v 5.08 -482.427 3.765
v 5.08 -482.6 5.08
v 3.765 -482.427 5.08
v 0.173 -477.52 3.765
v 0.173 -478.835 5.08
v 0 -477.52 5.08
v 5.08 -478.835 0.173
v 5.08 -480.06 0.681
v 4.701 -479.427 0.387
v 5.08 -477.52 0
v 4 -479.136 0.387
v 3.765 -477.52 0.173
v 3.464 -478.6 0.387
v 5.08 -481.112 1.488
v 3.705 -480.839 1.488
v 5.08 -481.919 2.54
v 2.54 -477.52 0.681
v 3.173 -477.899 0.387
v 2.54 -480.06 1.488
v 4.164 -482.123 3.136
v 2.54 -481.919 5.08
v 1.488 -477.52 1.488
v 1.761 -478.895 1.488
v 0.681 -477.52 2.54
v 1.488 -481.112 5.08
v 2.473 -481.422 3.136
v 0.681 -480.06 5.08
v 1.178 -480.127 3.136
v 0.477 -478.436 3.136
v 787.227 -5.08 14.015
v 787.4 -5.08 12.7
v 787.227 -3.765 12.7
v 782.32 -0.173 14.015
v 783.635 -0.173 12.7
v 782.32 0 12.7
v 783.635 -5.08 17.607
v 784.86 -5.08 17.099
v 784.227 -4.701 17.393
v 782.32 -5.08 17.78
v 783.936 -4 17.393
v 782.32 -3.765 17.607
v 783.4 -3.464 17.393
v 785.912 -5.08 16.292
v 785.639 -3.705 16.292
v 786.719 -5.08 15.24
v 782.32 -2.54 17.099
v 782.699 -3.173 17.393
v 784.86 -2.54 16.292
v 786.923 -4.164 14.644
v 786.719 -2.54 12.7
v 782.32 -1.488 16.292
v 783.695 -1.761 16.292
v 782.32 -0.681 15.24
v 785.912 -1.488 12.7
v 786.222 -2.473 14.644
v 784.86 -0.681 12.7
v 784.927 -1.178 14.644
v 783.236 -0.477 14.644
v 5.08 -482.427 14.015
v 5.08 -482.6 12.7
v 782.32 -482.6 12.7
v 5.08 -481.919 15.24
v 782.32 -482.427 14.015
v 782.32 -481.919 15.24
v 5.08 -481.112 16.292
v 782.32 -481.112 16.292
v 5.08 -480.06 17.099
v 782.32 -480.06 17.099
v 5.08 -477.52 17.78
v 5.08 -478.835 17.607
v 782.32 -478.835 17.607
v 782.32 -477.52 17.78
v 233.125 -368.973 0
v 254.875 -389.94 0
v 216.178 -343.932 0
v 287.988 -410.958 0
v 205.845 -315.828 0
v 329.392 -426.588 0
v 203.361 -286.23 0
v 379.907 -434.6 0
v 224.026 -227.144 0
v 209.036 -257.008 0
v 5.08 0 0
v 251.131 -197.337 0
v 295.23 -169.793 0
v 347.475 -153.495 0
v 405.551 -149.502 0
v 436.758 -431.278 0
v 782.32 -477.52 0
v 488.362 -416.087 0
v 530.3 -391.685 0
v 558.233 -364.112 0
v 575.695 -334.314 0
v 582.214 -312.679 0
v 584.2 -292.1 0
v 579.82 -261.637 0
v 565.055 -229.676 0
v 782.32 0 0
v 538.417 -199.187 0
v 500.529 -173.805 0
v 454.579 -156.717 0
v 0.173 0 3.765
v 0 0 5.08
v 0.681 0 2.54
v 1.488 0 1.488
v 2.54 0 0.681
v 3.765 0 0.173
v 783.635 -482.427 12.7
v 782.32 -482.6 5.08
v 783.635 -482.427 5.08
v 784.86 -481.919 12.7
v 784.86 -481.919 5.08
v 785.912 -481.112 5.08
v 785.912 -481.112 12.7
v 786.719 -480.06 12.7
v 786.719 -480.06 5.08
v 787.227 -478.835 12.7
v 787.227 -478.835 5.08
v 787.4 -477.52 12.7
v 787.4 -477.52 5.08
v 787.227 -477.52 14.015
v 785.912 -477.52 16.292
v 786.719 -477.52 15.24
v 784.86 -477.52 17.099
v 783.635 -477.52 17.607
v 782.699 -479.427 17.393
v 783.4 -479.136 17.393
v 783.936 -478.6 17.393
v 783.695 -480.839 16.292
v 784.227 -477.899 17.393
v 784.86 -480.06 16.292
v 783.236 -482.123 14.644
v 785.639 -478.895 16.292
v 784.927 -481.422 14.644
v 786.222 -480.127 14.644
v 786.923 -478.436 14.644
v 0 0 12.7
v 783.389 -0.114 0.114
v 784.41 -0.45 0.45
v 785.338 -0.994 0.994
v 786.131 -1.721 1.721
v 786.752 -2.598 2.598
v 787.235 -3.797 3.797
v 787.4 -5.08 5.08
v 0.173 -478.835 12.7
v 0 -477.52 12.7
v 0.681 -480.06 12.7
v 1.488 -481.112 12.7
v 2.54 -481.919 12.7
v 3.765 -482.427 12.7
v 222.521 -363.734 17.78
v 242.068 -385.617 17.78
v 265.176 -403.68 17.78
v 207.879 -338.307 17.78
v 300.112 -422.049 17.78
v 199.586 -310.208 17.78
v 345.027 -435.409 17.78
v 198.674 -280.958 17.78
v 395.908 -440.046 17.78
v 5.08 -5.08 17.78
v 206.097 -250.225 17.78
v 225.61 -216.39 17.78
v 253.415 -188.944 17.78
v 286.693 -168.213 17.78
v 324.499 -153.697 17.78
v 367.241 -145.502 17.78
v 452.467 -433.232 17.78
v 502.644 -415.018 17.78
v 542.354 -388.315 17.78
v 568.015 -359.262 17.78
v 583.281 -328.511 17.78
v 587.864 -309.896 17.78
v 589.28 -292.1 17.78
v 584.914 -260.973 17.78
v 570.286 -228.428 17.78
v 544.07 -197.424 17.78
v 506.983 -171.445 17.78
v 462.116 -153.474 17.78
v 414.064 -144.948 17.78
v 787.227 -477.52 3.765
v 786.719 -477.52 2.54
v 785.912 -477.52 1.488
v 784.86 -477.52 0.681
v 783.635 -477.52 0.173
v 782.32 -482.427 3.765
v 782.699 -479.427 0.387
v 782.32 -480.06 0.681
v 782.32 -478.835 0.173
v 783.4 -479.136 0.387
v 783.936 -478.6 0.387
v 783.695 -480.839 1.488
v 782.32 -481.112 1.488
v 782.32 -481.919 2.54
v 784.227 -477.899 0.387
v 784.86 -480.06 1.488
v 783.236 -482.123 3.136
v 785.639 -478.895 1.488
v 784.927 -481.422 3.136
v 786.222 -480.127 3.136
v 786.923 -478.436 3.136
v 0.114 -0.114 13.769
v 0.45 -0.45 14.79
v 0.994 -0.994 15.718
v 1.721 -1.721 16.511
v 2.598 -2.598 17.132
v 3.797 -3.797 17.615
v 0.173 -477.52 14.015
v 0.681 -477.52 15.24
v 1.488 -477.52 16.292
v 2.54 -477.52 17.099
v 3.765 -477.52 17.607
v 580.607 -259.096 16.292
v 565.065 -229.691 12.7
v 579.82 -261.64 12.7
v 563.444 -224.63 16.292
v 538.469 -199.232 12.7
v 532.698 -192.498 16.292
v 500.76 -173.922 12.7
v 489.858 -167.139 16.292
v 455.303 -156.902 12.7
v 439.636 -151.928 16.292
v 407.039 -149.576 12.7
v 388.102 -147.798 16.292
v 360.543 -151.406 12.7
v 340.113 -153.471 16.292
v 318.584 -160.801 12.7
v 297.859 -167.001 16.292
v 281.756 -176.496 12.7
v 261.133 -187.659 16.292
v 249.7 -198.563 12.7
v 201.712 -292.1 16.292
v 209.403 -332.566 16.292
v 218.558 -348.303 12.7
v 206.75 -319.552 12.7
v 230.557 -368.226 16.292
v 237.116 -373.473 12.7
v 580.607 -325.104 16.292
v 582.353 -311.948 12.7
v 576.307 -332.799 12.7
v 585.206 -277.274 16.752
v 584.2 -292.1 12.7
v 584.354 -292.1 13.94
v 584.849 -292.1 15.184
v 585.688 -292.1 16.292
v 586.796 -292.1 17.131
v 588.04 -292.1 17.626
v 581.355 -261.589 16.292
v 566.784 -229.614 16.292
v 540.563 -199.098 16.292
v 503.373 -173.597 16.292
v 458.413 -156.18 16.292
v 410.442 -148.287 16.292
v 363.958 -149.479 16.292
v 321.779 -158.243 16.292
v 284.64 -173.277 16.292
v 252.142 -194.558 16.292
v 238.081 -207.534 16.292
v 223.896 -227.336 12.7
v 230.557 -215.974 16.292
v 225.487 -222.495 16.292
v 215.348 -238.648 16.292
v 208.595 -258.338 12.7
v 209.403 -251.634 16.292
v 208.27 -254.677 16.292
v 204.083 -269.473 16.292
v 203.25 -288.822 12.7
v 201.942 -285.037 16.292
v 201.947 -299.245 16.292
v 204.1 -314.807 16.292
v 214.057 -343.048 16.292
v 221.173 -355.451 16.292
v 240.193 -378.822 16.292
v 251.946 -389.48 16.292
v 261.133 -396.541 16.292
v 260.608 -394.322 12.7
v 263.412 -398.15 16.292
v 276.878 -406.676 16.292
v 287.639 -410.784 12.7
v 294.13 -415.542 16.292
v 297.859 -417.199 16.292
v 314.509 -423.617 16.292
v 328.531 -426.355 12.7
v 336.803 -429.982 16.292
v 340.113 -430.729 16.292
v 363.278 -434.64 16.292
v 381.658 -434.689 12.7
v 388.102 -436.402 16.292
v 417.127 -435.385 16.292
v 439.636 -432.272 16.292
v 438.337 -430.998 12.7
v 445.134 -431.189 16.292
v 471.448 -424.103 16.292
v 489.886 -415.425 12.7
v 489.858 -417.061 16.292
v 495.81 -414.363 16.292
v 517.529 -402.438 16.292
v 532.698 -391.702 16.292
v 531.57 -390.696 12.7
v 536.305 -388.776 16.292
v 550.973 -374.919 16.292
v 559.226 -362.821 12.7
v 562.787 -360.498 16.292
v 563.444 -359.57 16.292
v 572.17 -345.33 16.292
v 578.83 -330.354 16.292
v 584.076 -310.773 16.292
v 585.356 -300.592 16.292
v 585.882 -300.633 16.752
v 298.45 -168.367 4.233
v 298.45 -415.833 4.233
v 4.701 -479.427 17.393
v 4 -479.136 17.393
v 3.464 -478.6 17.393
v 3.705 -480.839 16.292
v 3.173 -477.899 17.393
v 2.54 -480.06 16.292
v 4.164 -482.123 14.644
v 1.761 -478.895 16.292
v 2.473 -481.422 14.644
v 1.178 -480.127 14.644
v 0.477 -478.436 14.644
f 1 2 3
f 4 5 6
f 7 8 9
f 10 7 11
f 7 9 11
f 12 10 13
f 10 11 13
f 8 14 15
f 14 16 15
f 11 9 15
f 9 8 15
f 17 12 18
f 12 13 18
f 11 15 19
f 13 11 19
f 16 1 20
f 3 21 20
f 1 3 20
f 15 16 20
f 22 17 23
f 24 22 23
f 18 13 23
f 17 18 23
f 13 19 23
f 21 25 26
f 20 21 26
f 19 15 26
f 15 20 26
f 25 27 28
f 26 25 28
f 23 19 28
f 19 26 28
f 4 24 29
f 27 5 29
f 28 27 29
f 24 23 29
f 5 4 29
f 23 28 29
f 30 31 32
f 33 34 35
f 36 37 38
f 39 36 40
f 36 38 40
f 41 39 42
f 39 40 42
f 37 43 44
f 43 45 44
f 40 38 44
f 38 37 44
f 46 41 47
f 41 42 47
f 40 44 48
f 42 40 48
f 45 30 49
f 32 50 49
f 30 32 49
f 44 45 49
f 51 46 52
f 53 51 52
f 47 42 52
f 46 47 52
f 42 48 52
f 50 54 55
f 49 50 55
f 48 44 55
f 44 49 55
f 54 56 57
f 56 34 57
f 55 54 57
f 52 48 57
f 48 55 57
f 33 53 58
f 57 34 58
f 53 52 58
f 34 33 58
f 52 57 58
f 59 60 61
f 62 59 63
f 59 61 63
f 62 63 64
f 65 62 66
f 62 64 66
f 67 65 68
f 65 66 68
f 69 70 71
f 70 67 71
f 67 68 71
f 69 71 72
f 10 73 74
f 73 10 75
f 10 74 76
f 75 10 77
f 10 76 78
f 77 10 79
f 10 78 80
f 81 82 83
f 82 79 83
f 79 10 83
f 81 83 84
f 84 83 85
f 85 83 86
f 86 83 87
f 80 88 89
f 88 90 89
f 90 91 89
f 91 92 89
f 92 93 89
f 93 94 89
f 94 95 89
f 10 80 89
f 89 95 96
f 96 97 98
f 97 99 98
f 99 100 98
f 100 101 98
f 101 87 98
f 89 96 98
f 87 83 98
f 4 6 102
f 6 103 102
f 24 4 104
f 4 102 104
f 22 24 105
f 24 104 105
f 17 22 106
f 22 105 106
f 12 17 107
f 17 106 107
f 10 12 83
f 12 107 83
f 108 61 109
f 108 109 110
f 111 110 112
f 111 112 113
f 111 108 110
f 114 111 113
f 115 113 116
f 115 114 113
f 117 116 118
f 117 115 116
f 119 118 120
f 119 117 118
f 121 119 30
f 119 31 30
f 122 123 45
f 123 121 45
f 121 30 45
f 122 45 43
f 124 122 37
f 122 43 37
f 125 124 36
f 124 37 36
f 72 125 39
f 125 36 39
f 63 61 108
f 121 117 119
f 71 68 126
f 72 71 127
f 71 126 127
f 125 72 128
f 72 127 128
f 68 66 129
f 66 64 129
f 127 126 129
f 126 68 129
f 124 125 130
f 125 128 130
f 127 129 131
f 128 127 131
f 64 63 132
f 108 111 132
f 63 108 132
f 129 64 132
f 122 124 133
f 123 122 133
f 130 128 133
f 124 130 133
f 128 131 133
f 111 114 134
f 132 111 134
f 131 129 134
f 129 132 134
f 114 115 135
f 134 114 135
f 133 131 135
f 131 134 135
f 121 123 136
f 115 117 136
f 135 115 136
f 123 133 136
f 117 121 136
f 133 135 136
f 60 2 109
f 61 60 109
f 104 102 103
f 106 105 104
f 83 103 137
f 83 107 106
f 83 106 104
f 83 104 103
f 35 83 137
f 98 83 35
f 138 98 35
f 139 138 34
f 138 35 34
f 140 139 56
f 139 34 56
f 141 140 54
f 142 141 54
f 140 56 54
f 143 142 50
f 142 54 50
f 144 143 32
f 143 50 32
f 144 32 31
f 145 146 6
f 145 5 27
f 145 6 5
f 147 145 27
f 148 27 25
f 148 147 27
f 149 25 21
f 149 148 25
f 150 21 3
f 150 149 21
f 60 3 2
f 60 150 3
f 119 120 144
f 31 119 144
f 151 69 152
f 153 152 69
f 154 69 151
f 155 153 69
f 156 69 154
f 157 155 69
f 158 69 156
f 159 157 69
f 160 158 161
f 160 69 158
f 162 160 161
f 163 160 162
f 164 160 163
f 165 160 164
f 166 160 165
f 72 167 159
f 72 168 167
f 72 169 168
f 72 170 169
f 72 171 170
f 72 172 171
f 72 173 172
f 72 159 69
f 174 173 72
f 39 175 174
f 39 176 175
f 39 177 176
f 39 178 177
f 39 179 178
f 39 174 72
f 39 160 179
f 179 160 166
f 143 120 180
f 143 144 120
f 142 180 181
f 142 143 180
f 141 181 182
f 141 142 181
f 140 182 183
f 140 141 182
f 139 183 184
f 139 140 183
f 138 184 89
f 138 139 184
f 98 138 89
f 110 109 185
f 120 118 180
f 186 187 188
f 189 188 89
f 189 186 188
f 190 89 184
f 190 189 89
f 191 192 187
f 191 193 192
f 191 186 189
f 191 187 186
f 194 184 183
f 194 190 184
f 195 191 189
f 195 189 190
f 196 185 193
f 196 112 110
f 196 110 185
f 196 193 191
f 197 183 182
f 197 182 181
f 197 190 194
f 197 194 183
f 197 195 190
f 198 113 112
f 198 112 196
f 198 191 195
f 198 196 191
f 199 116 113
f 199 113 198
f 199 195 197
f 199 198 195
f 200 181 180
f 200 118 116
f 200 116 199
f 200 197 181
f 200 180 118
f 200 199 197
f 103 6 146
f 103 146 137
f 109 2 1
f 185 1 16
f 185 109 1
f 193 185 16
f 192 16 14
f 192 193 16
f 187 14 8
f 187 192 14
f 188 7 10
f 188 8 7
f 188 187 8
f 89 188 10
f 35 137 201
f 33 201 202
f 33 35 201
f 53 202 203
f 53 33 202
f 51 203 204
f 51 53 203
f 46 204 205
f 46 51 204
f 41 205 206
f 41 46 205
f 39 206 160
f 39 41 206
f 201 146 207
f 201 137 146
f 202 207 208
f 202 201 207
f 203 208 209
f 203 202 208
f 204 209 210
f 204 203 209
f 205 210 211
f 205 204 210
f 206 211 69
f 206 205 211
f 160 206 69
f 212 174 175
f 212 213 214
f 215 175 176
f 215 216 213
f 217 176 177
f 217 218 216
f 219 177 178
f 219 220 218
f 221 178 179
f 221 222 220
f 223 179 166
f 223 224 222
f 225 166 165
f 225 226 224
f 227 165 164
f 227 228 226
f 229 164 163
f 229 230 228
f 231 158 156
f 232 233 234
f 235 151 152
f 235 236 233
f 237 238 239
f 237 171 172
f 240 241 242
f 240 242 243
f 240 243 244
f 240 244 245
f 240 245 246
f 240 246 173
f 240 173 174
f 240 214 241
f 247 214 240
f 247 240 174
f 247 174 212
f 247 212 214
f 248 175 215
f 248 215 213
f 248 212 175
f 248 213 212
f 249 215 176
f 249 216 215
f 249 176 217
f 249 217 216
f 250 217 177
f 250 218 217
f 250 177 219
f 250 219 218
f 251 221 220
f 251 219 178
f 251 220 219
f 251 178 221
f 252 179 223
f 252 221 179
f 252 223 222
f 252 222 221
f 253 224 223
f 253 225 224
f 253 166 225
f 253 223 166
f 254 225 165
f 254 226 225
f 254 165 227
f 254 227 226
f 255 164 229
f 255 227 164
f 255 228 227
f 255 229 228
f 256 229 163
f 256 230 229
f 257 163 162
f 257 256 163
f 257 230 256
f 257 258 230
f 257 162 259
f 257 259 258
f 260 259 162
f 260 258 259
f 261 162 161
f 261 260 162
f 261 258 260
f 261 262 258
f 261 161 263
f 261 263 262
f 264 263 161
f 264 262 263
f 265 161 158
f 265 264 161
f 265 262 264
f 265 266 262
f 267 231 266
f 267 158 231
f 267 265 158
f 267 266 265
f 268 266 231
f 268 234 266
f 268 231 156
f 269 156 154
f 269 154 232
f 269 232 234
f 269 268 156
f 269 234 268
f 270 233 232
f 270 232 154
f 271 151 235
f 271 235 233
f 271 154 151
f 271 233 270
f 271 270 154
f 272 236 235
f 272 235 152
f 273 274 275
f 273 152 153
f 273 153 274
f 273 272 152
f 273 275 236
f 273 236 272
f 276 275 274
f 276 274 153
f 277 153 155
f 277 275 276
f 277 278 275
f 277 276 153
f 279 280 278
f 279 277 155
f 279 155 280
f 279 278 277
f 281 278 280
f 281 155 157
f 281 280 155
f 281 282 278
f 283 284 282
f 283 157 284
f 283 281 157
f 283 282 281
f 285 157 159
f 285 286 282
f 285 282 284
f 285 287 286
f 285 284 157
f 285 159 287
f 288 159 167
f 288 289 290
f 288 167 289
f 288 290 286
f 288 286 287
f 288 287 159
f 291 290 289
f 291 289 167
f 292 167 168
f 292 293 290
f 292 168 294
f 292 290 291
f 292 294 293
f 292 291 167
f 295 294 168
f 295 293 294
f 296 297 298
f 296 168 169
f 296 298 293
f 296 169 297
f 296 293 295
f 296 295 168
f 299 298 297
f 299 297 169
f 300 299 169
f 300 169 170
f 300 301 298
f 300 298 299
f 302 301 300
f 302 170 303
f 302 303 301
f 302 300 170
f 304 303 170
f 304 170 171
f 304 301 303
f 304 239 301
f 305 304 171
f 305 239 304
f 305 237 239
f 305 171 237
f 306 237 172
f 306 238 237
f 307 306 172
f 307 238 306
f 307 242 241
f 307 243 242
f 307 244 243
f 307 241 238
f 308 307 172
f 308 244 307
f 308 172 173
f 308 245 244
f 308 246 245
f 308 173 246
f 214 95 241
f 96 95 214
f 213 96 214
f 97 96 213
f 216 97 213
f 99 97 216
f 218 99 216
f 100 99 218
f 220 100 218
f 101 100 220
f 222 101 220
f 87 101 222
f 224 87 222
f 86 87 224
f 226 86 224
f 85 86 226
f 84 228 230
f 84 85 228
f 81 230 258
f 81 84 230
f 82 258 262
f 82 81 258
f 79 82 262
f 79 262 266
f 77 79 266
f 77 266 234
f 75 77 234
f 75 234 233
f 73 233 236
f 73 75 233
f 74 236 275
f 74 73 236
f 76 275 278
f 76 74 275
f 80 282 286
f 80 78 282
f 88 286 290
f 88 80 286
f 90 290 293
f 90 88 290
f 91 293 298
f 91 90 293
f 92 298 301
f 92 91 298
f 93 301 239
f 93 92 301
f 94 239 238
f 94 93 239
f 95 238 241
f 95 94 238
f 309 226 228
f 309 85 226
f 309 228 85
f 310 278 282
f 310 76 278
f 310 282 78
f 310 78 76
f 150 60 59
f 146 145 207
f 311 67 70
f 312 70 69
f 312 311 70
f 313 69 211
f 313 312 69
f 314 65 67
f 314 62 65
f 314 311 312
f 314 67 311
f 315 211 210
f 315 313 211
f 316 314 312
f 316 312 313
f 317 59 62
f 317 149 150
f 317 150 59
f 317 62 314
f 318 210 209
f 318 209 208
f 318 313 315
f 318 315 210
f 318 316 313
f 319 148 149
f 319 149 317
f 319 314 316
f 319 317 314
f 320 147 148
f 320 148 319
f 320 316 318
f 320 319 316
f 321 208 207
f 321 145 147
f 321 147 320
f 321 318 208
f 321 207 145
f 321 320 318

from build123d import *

# Parameters (mm, degrees)
F0_W     = 787.4
F0_H     = 482.6
F1_DEPTH = 17.78
F2_R     = 5.08


with BuildPart() as f1:
    # F0 (on Top) → F1 (new body)
    with BuildSketch(Plane.XY):
        with Locations((393.7, -241.3)):
            Rectangle(F0_W, F0_H)
        with BuildLine():
            add(Edge.make_bspline(
                [(584.2, -292.1), (584.2, -44.633241), (298.45, -168.36662), (12.7, -292.1), (298.45, -415.83338), (584.2, -539.566759), (584.2, -292.1)],
                knots=[0, 0, 0, 2.094395, 2.094395, 4.18879, 4.18879, 6.283185, 6.283185, 6.283185], degree=2, weights=[1, 0.5, 1, 0.5, 1, 0.5, 1]))
        make_face(mode=Mode.SUBTRACT)
    extrude(amount=F1_DEPTH)

    # F2
    f2_edges = [f1.edges().sort_by_distance(p)[0] for p in [
        (0, -482.6, 8.89),
        (787.4, -482.6, 8.89),
        (393.7, -482.6, 0),
        (393.7, -482.6, 17.78),
        (787.4, 0, 8.89),
        (787.4, -241.3, 0),
        (787.4, -241.3, 17.78),
        (393.7, 0, 17.78),
        (0, -241.3, 17.78),
        (203.2, -292.1, 17.78),
        (0, -241.3, 0),
    ]]
    fillet(f2_edges, radius=F2_R)


solid = f1.part
